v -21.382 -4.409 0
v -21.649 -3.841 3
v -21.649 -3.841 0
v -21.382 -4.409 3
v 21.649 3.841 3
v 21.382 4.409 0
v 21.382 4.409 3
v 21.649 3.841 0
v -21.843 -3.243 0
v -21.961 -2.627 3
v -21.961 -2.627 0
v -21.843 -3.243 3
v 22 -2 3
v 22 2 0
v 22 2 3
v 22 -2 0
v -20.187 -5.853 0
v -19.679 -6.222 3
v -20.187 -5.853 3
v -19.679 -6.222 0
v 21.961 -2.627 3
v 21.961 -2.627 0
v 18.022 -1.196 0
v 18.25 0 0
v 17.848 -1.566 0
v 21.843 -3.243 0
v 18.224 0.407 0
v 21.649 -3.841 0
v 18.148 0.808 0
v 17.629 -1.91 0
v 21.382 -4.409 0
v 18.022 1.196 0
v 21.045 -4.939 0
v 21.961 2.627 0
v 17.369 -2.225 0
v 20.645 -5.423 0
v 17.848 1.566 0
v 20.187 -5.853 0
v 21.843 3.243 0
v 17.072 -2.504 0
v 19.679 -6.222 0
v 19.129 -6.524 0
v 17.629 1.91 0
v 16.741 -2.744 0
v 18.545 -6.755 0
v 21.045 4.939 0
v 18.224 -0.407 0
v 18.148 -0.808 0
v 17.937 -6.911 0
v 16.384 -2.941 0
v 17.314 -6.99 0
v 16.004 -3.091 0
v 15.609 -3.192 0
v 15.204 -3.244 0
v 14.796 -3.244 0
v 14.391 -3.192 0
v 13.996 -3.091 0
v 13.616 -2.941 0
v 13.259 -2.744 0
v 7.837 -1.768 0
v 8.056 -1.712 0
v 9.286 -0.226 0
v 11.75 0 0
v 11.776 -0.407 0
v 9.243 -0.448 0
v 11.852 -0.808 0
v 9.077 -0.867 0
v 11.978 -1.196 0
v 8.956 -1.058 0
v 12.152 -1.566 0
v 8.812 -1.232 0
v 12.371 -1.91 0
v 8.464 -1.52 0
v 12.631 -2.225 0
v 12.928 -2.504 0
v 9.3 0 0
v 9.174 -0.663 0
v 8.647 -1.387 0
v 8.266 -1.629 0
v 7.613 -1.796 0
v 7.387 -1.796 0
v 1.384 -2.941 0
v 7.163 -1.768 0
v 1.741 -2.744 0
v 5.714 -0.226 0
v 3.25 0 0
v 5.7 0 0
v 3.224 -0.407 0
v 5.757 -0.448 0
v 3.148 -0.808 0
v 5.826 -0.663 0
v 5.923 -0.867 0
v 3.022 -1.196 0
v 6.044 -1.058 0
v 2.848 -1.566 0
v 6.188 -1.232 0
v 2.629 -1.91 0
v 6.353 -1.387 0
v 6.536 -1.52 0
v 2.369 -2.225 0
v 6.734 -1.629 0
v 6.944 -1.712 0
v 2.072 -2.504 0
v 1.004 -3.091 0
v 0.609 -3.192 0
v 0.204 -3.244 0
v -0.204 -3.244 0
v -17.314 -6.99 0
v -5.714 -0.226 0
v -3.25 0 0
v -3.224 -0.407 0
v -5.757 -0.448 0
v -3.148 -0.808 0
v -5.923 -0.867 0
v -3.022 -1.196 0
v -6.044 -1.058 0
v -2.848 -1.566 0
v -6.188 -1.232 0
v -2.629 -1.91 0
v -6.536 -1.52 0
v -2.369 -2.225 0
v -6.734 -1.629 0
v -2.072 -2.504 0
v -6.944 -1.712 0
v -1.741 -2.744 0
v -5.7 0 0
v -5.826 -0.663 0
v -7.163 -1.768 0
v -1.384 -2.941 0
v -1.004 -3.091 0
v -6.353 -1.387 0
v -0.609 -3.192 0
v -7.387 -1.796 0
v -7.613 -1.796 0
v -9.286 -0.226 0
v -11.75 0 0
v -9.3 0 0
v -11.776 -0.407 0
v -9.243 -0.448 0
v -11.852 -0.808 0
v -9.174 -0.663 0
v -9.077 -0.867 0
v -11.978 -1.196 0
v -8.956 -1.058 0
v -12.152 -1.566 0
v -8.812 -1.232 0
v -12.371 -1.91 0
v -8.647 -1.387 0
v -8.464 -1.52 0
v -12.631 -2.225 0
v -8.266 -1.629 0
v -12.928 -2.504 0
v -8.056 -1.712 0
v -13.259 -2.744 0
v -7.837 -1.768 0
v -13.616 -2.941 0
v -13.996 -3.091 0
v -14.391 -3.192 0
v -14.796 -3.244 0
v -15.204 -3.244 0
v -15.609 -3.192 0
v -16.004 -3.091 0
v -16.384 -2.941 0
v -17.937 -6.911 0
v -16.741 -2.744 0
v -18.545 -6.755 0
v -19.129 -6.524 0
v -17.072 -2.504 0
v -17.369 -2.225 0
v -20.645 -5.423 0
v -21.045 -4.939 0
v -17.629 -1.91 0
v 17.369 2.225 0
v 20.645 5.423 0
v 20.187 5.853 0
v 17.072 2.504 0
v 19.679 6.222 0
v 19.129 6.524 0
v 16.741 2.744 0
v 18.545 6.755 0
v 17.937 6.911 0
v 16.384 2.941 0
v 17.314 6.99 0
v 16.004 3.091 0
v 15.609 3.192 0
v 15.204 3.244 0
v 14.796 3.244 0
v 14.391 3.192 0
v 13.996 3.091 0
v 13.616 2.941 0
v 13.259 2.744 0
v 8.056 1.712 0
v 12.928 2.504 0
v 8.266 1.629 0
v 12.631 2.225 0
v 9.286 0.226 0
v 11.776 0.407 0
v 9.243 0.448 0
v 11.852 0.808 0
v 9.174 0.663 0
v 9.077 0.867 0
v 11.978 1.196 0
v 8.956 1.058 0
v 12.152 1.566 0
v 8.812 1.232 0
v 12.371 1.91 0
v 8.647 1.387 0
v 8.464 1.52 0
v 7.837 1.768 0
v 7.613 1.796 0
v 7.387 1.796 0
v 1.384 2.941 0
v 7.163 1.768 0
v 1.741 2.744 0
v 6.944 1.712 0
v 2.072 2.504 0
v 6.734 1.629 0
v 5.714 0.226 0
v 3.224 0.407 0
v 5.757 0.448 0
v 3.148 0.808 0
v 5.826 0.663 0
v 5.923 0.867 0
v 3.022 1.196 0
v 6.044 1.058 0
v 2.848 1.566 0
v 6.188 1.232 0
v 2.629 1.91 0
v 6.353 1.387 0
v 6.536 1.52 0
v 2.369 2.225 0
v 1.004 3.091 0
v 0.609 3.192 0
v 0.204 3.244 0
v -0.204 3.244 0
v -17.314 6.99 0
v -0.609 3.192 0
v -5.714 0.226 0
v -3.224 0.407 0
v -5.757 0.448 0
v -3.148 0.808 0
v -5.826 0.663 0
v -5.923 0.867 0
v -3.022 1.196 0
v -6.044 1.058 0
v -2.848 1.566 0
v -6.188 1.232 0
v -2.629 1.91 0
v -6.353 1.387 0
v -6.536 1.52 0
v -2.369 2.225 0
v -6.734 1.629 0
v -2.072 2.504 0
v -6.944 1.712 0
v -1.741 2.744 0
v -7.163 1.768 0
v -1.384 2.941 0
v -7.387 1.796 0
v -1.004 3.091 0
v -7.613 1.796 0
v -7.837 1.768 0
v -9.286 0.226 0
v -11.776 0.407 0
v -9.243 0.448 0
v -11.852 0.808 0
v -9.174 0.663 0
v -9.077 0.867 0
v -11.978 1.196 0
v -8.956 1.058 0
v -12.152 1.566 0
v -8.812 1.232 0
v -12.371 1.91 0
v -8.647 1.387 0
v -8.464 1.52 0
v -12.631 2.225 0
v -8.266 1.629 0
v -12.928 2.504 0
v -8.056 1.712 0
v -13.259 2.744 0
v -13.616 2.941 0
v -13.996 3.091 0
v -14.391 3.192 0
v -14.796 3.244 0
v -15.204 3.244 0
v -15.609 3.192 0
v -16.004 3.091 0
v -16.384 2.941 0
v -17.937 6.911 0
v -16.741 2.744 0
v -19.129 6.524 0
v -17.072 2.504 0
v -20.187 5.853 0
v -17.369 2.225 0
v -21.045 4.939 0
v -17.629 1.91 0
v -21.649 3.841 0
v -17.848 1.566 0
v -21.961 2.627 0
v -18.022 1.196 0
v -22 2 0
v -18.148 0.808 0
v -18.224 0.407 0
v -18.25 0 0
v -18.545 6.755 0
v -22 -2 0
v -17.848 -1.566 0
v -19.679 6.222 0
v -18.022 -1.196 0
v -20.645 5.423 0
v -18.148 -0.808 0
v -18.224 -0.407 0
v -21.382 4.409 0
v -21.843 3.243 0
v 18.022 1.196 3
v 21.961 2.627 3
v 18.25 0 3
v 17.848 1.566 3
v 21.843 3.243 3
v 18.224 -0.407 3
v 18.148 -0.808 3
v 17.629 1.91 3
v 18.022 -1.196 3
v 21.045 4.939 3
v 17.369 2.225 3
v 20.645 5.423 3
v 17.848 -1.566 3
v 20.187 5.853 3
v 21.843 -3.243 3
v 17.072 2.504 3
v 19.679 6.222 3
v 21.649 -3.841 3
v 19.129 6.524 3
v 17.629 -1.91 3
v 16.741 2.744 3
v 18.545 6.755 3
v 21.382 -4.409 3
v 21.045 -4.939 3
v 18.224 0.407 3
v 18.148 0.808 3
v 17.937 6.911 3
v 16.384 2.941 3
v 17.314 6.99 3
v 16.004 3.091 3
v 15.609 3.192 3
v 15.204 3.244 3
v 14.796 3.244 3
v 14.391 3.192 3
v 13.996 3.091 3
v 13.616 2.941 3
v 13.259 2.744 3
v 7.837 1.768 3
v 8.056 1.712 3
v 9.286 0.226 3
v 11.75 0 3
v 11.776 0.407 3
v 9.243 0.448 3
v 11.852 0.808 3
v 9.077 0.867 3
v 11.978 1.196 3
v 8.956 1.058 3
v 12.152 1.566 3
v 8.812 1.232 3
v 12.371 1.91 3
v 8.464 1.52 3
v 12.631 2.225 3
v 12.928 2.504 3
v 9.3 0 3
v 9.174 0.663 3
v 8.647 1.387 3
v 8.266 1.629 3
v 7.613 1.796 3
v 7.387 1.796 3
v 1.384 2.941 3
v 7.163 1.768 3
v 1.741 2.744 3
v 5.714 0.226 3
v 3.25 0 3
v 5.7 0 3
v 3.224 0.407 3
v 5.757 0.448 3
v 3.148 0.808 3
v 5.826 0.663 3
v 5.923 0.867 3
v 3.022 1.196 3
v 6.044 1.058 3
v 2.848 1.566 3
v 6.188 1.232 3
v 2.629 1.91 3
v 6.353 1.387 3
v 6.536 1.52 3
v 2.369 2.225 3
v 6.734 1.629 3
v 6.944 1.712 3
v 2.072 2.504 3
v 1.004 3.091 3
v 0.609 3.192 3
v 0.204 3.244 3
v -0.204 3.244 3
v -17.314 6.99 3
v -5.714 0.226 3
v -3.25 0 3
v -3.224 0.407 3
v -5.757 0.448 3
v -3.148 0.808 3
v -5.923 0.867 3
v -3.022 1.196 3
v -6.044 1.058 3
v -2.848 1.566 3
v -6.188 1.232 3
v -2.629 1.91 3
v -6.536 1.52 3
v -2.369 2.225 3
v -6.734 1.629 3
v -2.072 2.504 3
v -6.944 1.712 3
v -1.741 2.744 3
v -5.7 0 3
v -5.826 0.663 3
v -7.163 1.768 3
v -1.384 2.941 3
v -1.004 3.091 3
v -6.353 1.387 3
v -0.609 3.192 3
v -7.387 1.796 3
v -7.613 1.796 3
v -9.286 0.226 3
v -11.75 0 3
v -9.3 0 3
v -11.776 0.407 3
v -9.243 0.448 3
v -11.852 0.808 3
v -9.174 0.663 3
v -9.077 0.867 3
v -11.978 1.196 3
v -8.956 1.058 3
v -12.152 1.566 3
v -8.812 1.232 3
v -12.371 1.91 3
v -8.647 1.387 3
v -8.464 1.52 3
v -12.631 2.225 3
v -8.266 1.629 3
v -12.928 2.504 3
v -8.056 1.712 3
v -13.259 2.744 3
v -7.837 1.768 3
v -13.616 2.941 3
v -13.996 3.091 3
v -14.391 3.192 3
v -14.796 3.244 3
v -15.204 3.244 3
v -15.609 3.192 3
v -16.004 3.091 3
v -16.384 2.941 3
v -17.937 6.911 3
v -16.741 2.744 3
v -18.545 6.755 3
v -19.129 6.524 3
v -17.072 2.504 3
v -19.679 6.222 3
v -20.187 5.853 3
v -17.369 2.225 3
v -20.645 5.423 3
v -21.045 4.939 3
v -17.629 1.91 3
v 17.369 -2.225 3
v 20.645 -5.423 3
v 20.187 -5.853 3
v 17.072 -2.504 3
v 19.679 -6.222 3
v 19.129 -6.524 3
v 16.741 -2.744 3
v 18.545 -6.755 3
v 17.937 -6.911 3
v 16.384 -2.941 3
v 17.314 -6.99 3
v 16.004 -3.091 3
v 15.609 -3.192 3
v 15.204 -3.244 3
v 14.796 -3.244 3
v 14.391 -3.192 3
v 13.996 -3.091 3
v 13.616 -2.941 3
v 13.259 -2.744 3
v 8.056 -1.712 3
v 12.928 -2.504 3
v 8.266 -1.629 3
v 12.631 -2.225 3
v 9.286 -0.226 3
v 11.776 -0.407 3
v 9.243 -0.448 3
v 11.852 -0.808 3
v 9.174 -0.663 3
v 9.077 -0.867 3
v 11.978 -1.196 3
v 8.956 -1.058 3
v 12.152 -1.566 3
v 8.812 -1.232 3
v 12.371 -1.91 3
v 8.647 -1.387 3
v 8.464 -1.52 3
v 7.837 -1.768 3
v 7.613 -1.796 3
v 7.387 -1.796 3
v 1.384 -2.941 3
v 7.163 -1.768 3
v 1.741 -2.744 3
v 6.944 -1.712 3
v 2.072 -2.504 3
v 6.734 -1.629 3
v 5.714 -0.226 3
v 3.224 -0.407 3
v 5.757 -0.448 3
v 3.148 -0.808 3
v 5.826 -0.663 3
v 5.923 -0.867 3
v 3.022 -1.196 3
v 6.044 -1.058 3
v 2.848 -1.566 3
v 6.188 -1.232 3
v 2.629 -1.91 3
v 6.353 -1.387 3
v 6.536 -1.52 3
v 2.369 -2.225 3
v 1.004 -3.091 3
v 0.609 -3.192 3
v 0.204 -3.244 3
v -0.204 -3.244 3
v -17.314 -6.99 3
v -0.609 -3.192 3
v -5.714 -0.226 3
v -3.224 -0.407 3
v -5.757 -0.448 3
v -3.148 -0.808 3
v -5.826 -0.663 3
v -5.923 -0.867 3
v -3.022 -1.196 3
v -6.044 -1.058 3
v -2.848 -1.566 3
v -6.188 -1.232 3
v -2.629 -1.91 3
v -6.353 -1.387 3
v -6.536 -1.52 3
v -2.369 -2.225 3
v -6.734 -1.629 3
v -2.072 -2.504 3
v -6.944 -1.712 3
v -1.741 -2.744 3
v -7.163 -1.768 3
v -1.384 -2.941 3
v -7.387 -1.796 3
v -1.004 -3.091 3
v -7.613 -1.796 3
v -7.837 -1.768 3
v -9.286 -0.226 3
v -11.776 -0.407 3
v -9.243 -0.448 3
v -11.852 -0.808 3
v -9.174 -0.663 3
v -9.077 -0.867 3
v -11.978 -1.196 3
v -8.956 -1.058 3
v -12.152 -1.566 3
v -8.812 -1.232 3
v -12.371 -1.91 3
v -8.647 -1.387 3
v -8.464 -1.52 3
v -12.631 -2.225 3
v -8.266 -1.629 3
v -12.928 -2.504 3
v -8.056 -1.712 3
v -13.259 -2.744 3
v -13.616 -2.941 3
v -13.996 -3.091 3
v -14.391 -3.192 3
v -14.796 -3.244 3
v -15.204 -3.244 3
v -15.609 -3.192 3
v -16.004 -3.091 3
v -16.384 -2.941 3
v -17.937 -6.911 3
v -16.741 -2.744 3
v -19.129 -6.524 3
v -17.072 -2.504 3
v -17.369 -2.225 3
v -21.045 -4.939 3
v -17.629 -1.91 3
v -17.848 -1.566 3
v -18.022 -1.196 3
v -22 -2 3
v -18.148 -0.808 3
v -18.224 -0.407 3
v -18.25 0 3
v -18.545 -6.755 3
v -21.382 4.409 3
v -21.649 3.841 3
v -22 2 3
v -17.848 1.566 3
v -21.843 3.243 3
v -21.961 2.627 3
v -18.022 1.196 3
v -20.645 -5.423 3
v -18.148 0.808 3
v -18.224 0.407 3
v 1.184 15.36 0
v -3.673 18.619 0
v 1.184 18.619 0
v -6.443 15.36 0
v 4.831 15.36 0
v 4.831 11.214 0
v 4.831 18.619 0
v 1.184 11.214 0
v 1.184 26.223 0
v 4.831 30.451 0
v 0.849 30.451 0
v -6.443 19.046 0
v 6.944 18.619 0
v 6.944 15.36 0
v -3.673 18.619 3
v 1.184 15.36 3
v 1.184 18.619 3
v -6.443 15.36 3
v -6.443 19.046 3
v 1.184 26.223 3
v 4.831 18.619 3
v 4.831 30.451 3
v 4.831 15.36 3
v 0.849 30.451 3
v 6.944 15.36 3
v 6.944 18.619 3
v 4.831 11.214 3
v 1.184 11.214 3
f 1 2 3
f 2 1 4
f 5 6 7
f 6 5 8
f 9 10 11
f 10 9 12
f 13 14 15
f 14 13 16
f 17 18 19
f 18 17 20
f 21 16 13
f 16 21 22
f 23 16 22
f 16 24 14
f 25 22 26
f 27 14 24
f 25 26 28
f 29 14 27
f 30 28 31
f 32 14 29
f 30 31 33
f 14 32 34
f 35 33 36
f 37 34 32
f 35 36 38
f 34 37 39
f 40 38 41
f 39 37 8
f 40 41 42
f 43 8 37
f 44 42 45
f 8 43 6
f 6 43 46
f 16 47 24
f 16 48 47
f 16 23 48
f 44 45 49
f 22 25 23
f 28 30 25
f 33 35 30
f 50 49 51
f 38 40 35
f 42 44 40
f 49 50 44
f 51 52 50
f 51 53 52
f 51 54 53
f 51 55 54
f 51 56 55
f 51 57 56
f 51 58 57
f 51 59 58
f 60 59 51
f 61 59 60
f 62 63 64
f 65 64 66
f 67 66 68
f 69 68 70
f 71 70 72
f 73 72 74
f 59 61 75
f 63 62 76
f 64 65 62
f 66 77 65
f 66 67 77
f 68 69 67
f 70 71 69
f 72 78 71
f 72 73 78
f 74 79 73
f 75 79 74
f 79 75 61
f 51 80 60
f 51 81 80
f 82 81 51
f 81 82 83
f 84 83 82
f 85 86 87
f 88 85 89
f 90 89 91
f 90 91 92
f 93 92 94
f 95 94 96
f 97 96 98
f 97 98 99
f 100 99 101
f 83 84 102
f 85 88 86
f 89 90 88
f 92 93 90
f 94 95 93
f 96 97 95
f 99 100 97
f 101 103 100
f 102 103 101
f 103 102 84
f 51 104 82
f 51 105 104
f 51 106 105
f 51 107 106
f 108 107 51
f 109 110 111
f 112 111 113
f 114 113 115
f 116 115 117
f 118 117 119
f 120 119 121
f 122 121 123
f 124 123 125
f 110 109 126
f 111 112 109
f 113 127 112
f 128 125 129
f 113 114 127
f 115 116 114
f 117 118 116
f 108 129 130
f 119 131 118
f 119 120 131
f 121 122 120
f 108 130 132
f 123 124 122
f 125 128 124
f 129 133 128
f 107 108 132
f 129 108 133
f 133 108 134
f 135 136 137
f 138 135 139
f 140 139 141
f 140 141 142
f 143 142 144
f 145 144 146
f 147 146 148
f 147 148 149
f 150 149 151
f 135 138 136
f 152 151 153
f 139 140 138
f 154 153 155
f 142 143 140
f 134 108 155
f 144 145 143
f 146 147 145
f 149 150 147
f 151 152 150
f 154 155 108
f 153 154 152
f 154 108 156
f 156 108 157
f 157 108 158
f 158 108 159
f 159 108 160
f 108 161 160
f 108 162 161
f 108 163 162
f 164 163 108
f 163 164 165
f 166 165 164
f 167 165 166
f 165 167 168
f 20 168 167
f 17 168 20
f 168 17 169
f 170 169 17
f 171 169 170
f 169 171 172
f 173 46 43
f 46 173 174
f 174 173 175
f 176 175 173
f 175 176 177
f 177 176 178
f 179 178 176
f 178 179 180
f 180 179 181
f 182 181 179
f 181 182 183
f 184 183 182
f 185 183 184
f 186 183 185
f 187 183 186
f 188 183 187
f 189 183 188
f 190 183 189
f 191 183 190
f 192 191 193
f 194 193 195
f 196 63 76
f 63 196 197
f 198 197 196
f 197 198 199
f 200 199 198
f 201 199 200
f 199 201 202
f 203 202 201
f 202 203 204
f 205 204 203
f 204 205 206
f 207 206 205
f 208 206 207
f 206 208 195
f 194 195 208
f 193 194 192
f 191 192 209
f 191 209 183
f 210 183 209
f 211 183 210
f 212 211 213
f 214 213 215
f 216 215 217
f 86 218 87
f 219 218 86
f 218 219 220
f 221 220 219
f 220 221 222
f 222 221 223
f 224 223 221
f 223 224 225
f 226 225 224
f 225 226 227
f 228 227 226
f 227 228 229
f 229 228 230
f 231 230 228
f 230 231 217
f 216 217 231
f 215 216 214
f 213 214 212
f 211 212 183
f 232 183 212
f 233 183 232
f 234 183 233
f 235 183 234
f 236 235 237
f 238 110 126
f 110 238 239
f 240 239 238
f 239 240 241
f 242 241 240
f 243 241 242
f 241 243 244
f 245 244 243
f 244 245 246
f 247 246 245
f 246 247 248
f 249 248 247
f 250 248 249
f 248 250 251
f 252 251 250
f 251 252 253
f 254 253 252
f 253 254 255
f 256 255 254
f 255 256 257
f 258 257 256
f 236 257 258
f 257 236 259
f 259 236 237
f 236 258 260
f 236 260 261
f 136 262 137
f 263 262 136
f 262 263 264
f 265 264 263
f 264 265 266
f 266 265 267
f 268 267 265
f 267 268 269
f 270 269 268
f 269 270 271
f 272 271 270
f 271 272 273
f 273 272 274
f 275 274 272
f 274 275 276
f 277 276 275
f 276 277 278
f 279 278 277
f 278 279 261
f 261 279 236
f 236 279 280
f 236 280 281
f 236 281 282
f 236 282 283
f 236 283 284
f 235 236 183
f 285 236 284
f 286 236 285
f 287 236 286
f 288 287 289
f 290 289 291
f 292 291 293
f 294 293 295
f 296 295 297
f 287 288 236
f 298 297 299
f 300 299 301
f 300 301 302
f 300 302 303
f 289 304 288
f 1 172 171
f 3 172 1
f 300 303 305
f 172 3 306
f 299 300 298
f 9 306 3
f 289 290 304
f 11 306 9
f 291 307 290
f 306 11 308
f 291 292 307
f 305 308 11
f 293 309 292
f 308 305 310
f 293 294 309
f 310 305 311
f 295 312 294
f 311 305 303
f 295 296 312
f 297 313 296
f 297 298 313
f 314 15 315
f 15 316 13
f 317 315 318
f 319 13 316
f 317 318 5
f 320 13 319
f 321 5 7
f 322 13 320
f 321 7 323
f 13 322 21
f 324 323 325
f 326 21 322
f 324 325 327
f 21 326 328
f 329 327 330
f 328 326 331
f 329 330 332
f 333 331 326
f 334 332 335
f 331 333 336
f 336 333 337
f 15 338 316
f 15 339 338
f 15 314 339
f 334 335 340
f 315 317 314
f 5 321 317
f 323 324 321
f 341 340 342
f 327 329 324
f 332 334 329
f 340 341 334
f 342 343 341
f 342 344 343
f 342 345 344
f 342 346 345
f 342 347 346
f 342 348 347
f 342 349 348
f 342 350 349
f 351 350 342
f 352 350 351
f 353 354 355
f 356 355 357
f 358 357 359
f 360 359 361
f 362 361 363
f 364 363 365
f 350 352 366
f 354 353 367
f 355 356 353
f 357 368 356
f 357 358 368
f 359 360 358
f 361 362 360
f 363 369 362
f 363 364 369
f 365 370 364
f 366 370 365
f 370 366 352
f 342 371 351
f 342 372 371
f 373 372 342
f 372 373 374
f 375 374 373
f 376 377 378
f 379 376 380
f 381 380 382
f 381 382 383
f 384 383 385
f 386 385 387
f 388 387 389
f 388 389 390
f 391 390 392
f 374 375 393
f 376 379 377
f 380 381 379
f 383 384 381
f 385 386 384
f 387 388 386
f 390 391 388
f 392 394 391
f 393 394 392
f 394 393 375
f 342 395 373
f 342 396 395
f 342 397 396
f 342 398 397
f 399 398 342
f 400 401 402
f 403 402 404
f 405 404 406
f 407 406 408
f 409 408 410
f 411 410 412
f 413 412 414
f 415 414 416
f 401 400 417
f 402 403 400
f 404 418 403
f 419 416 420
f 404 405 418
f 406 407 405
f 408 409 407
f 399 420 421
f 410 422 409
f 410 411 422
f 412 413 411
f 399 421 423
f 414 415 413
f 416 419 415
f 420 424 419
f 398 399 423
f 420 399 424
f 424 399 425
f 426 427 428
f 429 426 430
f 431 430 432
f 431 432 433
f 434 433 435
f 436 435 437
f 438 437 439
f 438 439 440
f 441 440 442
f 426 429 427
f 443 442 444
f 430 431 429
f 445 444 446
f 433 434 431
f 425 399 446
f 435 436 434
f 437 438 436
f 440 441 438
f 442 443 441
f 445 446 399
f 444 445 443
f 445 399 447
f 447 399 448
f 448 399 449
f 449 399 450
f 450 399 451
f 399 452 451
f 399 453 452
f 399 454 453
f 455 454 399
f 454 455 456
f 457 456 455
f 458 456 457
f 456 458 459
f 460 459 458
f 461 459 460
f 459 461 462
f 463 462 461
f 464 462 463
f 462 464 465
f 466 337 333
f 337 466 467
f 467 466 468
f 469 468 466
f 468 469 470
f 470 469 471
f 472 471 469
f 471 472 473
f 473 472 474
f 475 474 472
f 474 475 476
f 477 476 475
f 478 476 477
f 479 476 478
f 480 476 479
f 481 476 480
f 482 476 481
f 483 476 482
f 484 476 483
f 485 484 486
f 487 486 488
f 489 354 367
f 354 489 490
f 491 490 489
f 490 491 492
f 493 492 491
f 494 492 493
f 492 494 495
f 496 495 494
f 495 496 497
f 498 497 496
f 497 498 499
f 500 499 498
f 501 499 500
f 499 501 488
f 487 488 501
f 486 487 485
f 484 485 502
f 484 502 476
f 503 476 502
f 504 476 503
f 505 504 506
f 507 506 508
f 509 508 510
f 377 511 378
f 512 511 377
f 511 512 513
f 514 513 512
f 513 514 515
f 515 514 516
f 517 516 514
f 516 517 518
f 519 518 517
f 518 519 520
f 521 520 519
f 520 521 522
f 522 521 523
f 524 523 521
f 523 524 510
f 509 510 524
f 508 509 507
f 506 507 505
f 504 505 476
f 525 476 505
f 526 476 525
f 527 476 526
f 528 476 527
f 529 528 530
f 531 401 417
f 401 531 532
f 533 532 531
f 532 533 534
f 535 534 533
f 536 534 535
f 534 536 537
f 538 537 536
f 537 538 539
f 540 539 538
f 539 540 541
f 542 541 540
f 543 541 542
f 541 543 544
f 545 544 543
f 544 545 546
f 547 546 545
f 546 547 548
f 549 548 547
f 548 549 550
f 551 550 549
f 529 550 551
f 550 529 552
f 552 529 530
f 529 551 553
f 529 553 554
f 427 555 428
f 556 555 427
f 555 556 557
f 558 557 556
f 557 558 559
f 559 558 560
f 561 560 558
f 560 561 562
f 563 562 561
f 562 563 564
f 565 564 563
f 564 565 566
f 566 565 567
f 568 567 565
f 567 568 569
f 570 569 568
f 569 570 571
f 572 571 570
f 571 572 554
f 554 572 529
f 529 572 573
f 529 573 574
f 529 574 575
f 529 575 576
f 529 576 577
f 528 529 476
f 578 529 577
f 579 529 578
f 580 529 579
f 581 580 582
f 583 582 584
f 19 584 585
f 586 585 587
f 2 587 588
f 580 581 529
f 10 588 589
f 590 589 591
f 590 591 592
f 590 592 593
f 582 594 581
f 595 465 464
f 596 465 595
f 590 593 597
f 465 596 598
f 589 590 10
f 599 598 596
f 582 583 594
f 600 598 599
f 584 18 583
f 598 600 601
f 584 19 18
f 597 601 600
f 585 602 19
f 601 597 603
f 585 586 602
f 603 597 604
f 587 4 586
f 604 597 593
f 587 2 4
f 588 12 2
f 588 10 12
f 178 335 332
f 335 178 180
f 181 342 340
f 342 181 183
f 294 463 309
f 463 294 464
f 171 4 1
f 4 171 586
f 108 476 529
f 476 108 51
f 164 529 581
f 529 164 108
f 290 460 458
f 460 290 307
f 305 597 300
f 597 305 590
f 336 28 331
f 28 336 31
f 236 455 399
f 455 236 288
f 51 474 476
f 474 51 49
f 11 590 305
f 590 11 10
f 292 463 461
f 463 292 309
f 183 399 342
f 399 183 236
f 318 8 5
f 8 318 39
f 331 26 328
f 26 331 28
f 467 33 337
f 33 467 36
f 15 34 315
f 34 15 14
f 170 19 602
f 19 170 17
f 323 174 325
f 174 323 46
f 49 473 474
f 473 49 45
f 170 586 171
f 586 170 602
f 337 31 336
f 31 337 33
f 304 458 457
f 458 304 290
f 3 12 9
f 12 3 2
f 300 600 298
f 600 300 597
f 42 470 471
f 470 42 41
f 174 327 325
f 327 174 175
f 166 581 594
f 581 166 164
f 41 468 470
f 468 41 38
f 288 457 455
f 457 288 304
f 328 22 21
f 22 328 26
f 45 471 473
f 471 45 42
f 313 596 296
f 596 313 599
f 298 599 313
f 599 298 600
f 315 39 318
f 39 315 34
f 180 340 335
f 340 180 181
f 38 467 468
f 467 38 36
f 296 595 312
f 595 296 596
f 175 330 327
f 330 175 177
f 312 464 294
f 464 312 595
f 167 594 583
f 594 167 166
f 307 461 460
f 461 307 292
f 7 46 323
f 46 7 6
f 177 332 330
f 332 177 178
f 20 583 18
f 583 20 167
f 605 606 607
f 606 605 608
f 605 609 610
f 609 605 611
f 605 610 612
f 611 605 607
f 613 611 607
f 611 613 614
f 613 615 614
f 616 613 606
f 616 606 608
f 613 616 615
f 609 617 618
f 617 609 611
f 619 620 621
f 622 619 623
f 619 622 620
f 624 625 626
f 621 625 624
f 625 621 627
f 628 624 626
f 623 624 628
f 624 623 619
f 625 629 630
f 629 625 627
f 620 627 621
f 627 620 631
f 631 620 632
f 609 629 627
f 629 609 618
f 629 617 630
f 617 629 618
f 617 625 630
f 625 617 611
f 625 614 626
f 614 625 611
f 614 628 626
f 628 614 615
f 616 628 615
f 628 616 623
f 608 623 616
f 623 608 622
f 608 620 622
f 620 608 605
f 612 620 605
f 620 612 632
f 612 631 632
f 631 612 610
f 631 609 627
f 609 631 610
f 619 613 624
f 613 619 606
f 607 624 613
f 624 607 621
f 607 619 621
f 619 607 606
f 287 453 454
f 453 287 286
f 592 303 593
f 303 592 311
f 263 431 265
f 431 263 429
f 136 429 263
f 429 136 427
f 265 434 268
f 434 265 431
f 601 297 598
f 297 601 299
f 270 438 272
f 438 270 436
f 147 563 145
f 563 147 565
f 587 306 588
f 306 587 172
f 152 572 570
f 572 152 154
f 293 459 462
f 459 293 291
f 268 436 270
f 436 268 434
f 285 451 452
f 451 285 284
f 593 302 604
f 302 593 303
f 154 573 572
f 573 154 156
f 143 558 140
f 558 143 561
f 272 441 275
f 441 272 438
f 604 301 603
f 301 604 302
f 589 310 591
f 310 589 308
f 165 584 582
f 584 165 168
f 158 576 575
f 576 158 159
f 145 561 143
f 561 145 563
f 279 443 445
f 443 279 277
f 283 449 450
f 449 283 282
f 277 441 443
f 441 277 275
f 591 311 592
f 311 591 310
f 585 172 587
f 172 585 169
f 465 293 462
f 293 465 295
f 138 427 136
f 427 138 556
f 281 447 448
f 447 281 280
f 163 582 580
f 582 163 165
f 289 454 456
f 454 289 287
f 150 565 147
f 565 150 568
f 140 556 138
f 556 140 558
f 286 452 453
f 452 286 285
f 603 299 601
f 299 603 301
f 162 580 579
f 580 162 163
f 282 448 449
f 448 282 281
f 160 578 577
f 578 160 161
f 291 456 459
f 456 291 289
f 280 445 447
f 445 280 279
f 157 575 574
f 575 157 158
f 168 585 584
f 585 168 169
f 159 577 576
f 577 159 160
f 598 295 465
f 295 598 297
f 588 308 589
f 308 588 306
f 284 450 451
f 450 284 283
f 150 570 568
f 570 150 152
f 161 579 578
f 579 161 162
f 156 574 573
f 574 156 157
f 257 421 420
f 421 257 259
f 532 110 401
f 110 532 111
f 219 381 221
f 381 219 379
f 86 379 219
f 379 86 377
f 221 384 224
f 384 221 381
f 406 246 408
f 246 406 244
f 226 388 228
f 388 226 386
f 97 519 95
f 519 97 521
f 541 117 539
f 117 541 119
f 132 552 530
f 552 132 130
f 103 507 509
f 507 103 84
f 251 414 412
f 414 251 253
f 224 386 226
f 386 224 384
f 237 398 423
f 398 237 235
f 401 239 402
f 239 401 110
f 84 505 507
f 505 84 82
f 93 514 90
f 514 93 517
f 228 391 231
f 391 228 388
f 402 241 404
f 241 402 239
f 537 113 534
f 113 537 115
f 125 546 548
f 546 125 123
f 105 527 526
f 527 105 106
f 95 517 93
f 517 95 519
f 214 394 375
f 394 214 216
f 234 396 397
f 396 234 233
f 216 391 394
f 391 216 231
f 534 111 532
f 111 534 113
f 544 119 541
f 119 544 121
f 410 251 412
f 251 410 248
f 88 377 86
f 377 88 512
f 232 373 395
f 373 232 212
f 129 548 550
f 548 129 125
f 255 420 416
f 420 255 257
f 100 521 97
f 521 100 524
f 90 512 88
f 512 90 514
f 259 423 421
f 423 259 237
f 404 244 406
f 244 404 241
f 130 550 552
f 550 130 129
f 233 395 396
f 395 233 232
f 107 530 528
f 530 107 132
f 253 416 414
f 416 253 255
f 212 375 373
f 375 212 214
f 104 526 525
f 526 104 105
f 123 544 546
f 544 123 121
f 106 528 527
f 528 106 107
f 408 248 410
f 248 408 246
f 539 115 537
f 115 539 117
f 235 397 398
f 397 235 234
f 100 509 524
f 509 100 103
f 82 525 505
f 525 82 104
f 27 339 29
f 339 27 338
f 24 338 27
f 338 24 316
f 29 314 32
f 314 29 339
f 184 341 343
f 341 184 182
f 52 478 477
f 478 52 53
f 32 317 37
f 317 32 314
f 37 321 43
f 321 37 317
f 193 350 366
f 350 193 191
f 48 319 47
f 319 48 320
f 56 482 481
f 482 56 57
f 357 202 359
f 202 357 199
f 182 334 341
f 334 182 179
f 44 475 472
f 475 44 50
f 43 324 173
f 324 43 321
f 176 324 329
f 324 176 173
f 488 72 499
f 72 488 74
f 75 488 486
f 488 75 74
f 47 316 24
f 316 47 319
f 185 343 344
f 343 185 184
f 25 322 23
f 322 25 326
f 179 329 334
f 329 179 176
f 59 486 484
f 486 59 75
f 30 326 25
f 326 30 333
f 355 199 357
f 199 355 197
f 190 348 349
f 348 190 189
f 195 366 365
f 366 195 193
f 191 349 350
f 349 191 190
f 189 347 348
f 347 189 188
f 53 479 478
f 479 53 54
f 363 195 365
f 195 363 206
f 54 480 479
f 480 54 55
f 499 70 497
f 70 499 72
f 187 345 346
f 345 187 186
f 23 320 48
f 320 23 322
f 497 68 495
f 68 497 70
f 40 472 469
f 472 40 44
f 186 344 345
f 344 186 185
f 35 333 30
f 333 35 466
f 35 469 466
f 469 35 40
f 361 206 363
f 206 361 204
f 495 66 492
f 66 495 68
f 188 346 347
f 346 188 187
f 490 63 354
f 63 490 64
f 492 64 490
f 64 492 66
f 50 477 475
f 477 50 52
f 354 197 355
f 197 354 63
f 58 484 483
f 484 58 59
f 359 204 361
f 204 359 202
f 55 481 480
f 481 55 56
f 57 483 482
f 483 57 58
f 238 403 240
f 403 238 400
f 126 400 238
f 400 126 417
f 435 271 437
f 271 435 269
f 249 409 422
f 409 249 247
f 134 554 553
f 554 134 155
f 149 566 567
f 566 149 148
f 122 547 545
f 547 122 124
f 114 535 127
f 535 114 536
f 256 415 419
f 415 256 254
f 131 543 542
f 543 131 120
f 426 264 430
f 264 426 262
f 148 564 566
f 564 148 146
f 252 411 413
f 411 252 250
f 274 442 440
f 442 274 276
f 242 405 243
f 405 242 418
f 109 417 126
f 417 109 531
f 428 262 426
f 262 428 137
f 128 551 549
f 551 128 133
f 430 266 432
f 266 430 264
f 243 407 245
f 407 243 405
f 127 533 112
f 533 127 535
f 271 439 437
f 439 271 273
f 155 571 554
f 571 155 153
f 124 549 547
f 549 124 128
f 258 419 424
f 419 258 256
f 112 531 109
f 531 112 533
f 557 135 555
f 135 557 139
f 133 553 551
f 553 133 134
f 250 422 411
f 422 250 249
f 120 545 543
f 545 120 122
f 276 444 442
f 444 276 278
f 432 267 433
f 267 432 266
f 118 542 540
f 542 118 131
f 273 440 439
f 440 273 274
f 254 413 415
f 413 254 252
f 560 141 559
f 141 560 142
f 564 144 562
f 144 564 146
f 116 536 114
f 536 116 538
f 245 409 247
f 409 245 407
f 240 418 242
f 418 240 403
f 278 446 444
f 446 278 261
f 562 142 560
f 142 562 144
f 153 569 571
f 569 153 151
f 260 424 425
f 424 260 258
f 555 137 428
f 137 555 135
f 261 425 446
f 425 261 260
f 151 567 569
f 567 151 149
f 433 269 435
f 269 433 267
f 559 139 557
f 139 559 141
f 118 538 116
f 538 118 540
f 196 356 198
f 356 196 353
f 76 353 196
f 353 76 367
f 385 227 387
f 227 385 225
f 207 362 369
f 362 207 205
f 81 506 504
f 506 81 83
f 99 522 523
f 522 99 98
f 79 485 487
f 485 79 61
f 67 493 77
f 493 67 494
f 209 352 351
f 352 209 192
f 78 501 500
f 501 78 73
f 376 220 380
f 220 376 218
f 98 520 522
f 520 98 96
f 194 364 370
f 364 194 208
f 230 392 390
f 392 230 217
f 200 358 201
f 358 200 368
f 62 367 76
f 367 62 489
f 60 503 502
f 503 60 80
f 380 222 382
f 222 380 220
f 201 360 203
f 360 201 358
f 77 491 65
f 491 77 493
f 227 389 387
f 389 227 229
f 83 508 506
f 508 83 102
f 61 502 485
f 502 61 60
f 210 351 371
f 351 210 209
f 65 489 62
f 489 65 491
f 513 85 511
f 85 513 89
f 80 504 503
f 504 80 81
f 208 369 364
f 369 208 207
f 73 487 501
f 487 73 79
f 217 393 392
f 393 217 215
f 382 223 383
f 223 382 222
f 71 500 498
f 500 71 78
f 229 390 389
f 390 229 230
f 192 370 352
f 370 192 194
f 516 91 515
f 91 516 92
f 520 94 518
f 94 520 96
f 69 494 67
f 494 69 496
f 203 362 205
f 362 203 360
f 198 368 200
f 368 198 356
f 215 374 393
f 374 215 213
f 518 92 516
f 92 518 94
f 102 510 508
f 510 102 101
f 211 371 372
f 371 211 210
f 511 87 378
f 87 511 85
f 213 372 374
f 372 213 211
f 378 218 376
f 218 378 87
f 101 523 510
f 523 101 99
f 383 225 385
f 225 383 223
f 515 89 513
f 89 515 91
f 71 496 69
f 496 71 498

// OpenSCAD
$fn = 50;


difference() {
	union() {
		hull() {
			translate(v = [-17.0000000000, 2.0000000000, 0]) {
				cylinder(h = 3, r = 5);
			}
			translate(v = [17.0000000000, 2.0000000000, 0]) {
				cylinder(h = 3, r = 5);
			}
			translate(v = [-17.0000000000, -2.0000000000, 0]) {
				cylinder(h = 3, r = 5);
			}
			translate(v = [17.0000000000, -2.0000000000, 0]) {
				cylinder(h = 3, r = 5);
			}
		}
		translate(v = [0, 30.0000000000, 0]) {
			linear_extrude(height = 3) {
				text(font = "DejaVu Sans Mono:style=Bold", halign = "center", size = 19.0000000000, text = "4", valign = "top");
			}
		}
	}
	union() {
		translate(v = [-15.0000000000, 0.0000000000, 0]) {
			translate(v = [0, 0, -100]) {
				cylinder(h = 200, r = 3.2500000000);
			}
		}
		translate(v = [0, 0, -100]) {
			cylinder(h = 200, r = 3.2500000000);
		}
		translate(v = [15.0000000000, 0.0000000000, 0]) {
			translate(v = [0, 0, -100]) {
				cylinder(h = 200, r = 3.2500000000);
			}
		}
		translate(v = [-15.0000000000, 0.0000000000, 0]) {
			translate(v = [0, 0, -100]) {
				cylinder(h = 200, r = 1.8000000000);
			}
		}
		translate(v = [-7.5000000000, 0.0000000000, 0]) {
			translate(v = [0, 0, -100]) {
				cylinder(h = 200, r = 1.8000000000);
			}
		}
		translate(v = [0, 0, -100]) {
			cylinder(h = 200, r = 1.8000000000);
		}
		translate(v = [7.5000000000, 0.0000000000, 0]) {
			translate(v = [0, 0, -100]) {
				cylinder(h = 200, r = 1.8000000000);
			}
		}
		translate(v = [15.0000000000, 0.0000000000, 0]) {
			translate(v = [0, 0, -100]) {
				cylinder(h = 200, r = 1.8000000000);
			}
		}
	}
}
